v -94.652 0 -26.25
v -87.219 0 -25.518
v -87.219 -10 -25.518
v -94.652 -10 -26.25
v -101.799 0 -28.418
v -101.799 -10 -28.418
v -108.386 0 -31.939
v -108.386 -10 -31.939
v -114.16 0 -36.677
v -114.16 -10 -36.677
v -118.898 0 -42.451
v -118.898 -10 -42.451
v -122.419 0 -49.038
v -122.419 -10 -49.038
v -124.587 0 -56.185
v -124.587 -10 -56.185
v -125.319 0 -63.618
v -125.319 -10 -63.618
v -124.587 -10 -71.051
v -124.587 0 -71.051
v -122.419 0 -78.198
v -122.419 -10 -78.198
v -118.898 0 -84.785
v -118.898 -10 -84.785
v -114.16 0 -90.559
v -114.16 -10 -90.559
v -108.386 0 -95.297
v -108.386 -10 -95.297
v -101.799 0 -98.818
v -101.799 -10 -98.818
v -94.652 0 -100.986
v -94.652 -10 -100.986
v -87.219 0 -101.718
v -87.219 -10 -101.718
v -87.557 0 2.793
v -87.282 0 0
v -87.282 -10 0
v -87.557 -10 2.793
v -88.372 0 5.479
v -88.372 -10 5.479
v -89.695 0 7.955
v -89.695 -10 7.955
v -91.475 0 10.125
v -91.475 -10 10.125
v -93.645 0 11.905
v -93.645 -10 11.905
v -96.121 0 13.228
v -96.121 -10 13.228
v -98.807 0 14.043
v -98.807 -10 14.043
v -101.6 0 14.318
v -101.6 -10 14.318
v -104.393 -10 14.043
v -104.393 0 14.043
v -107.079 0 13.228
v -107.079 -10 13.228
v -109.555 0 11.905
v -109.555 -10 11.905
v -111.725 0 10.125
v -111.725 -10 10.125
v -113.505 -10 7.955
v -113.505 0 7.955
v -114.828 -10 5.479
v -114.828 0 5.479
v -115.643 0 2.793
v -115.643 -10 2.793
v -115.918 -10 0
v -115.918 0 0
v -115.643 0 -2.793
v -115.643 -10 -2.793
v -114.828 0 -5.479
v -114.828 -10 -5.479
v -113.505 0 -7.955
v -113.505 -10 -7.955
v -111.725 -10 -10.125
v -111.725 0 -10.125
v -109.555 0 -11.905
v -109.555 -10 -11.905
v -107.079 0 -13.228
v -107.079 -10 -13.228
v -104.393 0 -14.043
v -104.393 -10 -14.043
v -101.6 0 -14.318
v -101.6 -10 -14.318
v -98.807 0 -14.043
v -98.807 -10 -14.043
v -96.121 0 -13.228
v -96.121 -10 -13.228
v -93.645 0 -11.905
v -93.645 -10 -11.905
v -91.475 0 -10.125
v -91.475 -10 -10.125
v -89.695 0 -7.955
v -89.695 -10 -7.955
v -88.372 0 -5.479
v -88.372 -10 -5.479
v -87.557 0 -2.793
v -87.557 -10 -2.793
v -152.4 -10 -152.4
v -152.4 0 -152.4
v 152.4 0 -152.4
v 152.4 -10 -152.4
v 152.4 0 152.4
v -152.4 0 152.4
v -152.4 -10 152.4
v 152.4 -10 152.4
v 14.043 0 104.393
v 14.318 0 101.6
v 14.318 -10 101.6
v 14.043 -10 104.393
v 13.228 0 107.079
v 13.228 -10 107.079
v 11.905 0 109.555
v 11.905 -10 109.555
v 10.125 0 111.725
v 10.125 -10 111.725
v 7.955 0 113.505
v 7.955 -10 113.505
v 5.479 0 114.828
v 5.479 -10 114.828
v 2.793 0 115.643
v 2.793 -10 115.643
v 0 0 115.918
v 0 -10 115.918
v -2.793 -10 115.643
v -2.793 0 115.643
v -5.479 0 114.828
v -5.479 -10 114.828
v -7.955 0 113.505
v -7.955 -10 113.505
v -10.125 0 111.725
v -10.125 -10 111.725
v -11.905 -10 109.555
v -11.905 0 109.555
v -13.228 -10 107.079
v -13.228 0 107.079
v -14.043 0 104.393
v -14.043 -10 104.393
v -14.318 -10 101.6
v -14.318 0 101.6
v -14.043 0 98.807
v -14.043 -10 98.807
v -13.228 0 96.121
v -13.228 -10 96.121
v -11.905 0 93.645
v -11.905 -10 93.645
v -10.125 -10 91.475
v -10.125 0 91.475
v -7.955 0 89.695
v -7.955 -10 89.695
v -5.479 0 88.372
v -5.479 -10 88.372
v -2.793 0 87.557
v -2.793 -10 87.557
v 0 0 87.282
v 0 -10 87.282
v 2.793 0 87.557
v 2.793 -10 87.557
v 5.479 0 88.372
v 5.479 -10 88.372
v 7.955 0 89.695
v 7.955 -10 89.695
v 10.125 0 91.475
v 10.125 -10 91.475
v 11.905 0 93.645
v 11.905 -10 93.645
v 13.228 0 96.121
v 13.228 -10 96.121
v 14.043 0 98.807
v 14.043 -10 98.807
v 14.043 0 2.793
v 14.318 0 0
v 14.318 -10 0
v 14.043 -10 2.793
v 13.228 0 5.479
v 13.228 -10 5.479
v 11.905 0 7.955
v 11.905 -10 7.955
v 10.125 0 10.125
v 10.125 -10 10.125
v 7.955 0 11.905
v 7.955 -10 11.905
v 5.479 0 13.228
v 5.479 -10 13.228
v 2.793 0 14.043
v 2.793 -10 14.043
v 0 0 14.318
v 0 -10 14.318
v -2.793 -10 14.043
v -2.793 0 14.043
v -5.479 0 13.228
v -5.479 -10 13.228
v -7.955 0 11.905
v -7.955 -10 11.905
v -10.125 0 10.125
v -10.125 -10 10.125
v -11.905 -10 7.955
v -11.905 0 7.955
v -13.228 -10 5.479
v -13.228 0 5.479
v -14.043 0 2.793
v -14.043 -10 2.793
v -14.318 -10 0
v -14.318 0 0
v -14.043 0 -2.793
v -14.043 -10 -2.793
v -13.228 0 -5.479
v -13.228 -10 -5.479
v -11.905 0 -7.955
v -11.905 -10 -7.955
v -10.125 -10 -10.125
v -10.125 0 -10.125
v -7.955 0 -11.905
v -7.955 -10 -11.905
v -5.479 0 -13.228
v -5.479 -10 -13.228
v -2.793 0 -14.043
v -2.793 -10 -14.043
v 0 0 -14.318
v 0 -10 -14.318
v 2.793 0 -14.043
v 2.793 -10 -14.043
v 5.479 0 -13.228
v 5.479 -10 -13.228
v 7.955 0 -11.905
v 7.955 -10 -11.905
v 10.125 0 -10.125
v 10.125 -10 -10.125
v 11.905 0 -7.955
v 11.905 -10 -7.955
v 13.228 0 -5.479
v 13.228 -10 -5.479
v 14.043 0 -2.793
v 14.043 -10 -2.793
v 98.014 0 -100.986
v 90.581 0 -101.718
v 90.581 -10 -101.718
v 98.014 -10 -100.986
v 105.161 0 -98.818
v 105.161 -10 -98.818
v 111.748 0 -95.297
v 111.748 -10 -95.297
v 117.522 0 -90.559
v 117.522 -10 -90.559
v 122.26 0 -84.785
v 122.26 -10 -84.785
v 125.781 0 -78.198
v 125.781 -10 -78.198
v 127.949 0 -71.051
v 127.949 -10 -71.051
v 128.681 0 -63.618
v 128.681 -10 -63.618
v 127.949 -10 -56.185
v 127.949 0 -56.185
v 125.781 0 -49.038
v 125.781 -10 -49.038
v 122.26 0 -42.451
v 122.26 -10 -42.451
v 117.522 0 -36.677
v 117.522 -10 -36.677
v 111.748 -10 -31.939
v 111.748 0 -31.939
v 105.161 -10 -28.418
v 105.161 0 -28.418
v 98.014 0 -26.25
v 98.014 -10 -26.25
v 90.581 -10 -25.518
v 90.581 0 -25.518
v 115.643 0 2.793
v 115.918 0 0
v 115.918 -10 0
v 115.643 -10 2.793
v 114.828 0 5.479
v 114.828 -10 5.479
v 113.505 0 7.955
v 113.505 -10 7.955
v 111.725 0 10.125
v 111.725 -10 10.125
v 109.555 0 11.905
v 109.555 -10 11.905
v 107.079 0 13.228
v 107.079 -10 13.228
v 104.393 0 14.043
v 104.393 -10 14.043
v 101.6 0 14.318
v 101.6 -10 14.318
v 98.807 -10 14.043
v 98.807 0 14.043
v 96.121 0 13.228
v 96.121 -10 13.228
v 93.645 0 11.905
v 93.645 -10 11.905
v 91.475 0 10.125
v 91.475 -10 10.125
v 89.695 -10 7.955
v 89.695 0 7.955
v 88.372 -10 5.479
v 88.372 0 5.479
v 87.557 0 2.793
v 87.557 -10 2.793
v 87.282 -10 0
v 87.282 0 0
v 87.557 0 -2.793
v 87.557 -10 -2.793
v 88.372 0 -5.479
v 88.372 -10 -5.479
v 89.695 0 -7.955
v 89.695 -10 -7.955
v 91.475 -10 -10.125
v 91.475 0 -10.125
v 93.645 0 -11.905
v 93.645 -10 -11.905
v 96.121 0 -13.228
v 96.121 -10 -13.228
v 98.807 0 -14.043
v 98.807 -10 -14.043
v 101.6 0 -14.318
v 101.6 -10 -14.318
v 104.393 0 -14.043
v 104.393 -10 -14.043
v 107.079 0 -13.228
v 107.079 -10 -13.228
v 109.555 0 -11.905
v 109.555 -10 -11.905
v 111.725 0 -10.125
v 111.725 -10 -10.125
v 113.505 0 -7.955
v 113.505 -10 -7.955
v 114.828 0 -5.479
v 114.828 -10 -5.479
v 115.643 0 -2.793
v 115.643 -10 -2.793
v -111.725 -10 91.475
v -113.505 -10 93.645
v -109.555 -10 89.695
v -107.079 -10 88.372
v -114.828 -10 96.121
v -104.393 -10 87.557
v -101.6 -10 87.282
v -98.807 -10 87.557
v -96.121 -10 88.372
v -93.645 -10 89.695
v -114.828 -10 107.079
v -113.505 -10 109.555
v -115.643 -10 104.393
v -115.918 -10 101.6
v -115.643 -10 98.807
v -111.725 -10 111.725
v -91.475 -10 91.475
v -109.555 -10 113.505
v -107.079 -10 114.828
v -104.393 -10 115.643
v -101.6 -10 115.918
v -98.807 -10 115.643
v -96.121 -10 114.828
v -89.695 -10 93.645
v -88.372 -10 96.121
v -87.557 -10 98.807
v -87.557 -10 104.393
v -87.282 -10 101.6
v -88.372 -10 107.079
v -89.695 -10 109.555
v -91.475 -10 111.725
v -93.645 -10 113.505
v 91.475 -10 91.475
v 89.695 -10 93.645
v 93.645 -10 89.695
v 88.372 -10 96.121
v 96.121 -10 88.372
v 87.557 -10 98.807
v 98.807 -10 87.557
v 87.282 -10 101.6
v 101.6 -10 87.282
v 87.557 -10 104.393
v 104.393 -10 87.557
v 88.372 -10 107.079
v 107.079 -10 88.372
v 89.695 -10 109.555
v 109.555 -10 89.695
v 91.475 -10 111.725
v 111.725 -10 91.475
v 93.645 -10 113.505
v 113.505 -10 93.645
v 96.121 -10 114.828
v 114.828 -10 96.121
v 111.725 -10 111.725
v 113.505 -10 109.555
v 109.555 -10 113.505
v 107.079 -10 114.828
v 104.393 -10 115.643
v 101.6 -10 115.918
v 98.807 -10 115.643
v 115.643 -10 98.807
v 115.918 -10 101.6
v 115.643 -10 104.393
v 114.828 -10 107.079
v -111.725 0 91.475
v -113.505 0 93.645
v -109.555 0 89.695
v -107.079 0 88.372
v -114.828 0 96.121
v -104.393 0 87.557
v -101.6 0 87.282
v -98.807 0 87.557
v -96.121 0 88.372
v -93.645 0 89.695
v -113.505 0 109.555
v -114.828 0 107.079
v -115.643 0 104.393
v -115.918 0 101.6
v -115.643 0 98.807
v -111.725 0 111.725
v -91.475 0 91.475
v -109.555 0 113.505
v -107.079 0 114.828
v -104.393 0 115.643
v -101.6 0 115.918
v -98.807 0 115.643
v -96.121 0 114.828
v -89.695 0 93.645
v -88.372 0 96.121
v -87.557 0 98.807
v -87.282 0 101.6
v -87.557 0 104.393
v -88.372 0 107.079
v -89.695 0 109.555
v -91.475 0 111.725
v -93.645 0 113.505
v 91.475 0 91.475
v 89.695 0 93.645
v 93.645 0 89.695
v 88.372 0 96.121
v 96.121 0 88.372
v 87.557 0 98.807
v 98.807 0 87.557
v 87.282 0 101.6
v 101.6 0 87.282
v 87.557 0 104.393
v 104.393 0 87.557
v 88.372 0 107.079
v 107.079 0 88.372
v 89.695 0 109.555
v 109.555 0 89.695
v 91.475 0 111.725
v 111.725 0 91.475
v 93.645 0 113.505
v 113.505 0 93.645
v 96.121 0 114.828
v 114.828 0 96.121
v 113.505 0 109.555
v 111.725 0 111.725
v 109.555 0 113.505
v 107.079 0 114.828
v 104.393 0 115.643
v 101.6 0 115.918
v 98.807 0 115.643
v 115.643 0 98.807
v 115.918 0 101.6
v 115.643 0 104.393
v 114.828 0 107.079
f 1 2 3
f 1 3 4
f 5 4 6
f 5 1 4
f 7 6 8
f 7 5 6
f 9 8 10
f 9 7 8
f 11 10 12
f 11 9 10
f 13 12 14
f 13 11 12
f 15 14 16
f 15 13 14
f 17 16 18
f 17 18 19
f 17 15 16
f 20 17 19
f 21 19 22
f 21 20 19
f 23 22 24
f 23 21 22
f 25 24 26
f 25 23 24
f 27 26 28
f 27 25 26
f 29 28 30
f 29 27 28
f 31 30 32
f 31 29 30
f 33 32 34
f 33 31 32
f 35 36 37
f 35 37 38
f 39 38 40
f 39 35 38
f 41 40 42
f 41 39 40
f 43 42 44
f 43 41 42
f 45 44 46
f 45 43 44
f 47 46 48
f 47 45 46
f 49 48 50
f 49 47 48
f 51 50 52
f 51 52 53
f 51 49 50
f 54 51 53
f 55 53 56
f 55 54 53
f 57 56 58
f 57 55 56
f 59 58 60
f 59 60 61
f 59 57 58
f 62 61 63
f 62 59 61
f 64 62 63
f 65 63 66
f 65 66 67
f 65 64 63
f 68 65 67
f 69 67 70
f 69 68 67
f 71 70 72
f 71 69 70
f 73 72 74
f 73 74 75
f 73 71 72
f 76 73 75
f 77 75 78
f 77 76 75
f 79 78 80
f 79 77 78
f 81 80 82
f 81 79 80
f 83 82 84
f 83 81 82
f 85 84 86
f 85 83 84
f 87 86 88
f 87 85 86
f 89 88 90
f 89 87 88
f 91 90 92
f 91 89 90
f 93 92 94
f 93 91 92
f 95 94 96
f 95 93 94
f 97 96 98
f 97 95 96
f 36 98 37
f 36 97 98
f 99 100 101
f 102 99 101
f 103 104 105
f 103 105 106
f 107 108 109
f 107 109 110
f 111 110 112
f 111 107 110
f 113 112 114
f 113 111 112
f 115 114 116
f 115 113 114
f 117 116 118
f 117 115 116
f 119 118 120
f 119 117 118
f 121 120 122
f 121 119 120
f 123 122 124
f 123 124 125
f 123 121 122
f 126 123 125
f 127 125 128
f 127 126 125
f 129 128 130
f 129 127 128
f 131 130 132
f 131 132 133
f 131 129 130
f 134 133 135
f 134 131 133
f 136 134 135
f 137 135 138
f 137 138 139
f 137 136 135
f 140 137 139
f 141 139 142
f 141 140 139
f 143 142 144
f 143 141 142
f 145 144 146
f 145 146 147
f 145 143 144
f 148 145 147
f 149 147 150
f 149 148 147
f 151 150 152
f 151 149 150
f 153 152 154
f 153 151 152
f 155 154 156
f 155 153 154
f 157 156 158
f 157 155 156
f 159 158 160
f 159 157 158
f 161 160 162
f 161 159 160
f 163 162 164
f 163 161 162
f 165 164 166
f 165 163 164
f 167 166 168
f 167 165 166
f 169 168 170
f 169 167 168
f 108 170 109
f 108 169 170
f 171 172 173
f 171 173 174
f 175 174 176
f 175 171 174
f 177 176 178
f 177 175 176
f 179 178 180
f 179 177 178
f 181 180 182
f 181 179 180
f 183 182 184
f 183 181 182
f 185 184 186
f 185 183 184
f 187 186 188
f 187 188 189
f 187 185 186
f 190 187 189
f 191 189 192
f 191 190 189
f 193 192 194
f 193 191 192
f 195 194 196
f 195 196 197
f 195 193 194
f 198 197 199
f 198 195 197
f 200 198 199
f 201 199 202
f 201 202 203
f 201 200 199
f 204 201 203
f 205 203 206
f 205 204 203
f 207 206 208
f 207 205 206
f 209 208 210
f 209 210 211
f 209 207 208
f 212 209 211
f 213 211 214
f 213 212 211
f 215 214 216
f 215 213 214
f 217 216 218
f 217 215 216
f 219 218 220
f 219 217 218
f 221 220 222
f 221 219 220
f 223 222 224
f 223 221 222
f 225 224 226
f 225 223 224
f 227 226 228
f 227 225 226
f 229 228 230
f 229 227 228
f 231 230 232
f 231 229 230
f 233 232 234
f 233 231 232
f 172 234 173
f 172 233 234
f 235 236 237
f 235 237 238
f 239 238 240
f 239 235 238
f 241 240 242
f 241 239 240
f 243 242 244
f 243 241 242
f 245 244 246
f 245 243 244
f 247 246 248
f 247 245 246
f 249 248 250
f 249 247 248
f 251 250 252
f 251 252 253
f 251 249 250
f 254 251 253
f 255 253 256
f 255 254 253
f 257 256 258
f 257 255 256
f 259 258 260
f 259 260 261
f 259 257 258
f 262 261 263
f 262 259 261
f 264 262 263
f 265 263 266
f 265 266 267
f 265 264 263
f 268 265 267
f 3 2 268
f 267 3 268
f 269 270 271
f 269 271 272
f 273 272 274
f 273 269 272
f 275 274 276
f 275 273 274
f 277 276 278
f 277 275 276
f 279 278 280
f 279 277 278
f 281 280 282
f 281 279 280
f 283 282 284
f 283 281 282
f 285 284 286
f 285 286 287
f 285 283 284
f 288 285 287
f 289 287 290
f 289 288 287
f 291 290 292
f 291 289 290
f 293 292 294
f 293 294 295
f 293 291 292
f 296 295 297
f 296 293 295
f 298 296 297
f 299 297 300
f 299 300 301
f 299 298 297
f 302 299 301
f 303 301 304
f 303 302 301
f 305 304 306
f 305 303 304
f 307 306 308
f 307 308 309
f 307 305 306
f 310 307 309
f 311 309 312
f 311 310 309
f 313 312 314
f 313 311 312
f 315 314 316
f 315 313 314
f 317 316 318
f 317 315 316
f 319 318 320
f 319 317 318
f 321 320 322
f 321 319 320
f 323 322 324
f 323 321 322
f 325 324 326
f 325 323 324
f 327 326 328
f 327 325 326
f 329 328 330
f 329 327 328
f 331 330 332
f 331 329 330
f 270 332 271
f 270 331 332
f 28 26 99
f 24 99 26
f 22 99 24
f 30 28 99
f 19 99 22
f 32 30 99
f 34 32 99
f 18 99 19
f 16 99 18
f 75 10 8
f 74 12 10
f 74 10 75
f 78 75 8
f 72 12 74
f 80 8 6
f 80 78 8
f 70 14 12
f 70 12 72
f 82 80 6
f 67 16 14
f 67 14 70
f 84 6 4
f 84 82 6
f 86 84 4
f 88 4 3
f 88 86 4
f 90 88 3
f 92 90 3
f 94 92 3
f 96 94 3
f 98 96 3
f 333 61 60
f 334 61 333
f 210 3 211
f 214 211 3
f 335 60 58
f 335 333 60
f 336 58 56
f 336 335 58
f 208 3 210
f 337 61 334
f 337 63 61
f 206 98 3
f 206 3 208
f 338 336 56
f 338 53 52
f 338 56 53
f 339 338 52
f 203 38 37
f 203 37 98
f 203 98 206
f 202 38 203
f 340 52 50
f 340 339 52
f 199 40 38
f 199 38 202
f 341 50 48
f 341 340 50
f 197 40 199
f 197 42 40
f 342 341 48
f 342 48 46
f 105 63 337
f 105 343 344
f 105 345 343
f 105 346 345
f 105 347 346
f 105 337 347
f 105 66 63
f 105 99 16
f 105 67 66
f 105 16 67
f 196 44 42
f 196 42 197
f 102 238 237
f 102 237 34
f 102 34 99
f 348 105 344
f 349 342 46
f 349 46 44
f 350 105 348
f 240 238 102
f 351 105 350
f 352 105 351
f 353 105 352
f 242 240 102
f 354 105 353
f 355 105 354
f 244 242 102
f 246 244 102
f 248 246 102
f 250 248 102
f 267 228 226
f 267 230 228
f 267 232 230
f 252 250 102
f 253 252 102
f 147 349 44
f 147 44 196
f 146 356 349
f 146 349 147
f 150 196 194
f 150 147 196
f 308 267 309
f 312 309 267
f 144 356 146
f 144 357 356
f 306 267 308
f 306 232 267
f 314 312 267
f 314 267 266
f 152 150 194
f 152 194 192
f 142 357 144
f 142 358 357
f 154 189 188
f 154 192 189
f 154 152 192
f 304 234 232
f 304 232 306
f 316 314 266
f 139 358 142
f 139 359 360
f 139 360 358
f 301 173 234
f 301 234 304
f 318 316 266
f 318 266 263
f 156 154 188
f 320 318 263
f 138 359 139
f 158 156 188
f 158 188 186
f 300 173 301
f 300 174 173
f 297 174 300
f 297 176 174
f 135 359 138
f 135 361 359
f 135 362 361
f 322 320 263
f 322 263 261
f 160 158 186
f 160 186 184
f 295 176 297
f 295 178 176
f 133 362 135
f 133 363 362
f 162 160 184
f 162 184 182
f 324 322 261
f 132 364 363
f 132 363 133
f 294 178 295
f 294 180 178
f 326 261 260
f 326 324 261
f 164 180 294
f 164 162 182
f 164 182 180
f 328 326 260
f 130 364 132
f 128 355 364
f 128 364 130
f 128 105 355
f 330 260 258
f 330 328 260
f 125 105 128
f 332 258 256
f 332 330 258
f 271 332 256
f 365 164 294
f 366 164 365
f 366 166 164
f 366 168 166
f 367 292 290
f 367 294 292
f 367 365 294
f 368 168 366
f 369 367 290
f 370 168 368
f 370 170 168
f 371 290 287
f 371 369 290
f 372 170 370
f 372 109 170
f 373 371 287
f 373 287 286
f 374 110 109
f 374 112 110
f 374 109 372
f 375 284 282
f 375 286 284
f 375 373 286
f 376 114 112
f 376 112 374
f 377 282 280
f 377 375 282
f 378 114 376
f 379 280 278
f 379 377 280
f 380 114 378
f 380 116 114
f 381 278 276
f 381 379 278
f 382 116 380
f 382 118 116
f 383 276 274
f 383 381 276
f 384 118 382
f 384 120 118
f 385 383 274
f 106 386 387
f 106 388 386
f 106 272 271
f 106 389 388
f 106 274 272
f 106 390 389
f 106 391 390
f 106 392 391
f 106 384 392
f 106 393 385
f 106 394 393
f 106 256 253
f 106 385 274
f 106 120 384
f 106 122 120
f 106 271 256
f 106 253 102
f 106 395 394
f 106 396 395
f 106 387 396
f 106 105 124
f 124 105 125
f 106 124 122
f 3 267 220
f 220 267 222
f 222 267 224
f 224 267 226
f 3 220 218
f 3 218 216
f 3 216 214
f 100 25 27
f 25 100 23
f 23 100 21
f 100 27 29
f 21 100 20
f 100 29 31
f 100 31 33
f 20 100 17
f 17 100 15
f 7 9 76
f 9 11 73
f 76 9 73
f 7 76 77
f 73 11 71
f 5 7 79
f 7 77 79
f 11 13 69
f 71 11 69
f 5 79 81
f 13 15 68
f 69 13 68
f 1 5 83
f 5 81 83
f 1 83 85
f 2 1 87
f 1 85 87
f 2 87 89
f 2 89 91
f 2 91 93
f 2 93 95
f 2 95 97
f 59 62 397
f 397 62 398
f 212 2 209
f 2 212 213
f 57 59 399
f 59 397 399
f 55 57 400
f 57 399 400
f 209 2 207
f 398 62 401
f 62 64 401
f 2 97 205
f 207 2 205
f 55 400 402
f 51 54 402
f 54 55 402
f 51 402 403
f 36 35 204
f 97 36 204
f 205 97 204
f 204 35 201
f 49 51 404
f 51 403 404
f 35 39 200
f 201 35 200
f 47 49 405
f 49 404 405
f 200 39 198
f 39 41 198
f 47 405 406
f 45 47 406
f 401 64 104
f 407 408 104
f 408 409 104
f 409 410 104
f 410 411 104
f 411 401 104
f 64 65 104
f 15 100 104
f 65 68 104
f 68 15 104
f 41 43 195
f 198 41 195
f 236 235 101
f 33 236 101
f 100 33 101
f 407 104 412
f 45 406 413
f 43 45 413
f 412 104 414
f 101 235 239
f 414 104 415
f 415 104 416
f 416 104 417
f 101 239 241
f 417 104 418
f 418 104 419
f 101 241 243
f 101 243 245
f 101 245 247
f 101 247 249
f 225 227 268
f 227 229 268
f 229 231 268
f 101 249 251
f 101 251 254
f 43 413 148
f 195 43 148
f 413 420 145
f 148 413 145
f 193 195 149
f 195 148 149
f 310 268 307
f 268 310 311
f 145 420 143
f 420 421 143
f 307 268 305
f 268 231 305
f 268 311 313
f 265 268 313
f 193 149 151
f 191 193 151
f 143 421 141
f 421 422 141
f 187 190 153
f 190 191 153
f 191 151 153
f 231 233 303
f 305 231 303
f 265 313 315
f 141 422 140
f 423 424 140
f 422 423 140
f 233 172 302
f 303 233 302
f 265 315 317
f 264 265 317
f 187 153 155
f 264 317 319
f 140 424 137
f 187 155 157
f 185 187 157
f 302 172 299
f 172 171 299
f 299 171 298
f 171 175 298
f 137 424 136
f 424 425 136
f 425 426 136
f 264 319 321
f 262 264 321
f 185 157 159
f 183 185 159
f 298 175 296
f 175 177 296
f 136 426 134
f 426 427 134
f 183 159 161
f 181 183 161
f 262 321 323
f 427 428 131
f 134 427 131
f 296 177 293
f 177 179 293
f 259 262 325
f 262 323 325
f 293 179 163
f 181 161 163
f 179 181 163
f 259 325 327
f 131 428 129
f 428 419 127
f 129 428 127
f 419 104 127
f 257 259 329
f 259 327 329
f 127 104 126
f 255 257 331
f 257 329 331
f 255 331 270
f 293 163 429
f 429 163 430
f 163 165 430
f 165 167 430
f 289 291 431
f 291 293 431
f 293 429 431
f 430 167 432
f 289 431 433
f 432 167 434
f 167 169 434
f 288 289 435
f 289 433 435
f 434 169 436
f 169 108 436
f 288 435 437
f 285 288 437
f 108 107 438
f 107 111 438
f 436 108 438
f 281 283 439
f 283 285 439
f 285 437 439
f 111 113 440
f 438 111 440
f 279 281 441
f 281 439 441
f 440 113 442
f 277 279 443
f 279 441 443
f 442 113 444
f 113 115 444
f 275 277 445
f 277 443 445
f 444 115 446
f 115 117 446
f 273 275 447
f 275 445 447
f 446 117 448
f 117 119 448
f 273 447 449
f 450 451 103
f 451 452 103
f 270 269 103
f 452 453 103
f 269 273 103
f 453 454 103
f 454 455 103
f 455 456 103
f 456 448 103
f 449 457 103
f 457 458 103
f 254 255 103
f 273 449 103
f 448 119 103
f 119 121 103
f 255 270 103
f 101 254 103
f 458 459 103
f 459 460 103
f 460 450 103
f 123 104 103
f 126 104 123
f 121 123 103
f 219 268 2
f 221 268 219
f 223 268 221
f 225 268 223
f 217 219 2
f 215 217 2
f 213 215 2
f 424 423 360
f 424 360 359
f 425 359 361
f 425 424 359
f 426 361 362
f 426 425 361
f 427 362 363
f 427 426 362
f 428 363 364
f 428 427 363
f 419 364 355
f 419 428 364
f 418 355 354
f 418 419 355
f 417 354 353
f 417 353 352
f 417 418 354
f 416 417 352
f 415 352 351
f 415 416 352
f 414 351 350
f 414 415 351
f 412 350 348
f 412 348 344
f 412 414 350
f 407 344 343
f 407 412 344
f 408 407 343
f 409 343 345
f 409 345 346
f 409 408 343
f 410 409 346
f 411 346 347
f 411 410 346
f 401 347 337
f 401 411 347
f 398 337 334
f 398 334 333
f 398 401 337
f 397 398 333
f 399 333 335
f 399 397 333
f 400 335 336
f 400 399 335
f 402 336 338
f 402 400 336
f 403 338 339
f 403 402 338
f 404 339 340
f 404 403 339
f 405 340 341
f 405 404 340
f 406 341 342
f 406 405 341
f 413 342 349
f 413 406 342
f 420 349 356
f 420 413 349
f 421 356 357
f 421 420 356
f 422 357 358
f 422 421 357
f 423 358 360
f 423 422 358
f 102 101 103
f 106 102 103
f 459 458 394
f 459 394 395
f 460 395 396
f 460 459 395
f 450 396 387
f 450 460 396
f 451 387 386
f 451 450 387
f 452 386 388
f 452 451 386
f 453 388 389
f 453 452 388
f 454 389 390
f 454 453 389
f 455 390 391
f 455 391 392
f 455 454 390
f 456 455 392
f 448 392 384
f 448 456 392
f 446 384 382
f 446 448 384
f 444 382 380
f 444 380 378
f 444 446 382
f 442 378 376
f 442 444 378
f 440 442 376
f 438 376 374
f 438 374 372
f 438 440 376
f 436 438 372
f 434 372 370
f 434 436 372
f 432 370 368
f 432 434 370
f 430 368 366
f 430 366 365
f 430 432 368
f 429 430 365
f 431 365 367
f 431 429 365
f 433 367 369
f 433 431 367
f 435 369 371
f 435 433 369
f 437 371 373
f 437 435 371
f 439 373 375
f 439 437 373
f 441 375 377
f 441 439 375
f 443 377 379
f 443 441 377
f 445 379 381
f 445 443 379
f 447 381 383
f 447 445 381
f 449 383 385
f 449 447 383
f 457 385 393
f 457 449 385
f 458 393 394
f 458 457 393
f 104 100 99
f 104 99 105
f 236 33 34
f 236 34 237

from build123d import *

# Parameters (mm, degrees)
SKETCH_W  = 304.8
SKETCH_H  = 304.8
SKETCH_R  = 14.318315
PAD_DEPTH = 10.000005


with BuildPart() as part:
    # Sketch → Pad (new body)
    with BuildSketch(Plane.XZ):
        Rectangle(SKETCH_W, SKETCH_H)
        with Locations((101.6, 101.6)):
            Circle(SKETCH_R, mode=Mode.SUBTRACT)
        with Locations((-101.6, 0)):
            Circle(SKETCH_R, mode=Mode.SUBTRACT)
        with Locations((101.6, 0)):
            Circle(SKETCH_R, mode=Mode.SUBTRACT)
        with Locations((0, 101.6)):
            Circle(SKETCH_R, mode=Mode.SUBTRACT)
        Circle(SKETCH_R, mode=Mode.SUBTRACT)
        with Locations((-101.6, 101.6)):
            Circle(SKETCH_R, mode=Mode.SUBTRACT)
        with BuildLine():
            ThreePointArc((-87.219092, -25.517974), (-125.319092, -63.617974), (-87.219092, -101.717974))
            Line((-87.219092, -101.717974), (90.580859, -101.717974))
            ThreePointArc((90.580859, -101.717974), (128.680859, -63.617974), (90.580859, -25.517974))
            Line((-87.219092, -25.517974), (90.580859, -25.517974))
        make_face(mode=Mode.SUBTRACT)
    extrude(amount=PAD_DEPTH)


solid = part.part
